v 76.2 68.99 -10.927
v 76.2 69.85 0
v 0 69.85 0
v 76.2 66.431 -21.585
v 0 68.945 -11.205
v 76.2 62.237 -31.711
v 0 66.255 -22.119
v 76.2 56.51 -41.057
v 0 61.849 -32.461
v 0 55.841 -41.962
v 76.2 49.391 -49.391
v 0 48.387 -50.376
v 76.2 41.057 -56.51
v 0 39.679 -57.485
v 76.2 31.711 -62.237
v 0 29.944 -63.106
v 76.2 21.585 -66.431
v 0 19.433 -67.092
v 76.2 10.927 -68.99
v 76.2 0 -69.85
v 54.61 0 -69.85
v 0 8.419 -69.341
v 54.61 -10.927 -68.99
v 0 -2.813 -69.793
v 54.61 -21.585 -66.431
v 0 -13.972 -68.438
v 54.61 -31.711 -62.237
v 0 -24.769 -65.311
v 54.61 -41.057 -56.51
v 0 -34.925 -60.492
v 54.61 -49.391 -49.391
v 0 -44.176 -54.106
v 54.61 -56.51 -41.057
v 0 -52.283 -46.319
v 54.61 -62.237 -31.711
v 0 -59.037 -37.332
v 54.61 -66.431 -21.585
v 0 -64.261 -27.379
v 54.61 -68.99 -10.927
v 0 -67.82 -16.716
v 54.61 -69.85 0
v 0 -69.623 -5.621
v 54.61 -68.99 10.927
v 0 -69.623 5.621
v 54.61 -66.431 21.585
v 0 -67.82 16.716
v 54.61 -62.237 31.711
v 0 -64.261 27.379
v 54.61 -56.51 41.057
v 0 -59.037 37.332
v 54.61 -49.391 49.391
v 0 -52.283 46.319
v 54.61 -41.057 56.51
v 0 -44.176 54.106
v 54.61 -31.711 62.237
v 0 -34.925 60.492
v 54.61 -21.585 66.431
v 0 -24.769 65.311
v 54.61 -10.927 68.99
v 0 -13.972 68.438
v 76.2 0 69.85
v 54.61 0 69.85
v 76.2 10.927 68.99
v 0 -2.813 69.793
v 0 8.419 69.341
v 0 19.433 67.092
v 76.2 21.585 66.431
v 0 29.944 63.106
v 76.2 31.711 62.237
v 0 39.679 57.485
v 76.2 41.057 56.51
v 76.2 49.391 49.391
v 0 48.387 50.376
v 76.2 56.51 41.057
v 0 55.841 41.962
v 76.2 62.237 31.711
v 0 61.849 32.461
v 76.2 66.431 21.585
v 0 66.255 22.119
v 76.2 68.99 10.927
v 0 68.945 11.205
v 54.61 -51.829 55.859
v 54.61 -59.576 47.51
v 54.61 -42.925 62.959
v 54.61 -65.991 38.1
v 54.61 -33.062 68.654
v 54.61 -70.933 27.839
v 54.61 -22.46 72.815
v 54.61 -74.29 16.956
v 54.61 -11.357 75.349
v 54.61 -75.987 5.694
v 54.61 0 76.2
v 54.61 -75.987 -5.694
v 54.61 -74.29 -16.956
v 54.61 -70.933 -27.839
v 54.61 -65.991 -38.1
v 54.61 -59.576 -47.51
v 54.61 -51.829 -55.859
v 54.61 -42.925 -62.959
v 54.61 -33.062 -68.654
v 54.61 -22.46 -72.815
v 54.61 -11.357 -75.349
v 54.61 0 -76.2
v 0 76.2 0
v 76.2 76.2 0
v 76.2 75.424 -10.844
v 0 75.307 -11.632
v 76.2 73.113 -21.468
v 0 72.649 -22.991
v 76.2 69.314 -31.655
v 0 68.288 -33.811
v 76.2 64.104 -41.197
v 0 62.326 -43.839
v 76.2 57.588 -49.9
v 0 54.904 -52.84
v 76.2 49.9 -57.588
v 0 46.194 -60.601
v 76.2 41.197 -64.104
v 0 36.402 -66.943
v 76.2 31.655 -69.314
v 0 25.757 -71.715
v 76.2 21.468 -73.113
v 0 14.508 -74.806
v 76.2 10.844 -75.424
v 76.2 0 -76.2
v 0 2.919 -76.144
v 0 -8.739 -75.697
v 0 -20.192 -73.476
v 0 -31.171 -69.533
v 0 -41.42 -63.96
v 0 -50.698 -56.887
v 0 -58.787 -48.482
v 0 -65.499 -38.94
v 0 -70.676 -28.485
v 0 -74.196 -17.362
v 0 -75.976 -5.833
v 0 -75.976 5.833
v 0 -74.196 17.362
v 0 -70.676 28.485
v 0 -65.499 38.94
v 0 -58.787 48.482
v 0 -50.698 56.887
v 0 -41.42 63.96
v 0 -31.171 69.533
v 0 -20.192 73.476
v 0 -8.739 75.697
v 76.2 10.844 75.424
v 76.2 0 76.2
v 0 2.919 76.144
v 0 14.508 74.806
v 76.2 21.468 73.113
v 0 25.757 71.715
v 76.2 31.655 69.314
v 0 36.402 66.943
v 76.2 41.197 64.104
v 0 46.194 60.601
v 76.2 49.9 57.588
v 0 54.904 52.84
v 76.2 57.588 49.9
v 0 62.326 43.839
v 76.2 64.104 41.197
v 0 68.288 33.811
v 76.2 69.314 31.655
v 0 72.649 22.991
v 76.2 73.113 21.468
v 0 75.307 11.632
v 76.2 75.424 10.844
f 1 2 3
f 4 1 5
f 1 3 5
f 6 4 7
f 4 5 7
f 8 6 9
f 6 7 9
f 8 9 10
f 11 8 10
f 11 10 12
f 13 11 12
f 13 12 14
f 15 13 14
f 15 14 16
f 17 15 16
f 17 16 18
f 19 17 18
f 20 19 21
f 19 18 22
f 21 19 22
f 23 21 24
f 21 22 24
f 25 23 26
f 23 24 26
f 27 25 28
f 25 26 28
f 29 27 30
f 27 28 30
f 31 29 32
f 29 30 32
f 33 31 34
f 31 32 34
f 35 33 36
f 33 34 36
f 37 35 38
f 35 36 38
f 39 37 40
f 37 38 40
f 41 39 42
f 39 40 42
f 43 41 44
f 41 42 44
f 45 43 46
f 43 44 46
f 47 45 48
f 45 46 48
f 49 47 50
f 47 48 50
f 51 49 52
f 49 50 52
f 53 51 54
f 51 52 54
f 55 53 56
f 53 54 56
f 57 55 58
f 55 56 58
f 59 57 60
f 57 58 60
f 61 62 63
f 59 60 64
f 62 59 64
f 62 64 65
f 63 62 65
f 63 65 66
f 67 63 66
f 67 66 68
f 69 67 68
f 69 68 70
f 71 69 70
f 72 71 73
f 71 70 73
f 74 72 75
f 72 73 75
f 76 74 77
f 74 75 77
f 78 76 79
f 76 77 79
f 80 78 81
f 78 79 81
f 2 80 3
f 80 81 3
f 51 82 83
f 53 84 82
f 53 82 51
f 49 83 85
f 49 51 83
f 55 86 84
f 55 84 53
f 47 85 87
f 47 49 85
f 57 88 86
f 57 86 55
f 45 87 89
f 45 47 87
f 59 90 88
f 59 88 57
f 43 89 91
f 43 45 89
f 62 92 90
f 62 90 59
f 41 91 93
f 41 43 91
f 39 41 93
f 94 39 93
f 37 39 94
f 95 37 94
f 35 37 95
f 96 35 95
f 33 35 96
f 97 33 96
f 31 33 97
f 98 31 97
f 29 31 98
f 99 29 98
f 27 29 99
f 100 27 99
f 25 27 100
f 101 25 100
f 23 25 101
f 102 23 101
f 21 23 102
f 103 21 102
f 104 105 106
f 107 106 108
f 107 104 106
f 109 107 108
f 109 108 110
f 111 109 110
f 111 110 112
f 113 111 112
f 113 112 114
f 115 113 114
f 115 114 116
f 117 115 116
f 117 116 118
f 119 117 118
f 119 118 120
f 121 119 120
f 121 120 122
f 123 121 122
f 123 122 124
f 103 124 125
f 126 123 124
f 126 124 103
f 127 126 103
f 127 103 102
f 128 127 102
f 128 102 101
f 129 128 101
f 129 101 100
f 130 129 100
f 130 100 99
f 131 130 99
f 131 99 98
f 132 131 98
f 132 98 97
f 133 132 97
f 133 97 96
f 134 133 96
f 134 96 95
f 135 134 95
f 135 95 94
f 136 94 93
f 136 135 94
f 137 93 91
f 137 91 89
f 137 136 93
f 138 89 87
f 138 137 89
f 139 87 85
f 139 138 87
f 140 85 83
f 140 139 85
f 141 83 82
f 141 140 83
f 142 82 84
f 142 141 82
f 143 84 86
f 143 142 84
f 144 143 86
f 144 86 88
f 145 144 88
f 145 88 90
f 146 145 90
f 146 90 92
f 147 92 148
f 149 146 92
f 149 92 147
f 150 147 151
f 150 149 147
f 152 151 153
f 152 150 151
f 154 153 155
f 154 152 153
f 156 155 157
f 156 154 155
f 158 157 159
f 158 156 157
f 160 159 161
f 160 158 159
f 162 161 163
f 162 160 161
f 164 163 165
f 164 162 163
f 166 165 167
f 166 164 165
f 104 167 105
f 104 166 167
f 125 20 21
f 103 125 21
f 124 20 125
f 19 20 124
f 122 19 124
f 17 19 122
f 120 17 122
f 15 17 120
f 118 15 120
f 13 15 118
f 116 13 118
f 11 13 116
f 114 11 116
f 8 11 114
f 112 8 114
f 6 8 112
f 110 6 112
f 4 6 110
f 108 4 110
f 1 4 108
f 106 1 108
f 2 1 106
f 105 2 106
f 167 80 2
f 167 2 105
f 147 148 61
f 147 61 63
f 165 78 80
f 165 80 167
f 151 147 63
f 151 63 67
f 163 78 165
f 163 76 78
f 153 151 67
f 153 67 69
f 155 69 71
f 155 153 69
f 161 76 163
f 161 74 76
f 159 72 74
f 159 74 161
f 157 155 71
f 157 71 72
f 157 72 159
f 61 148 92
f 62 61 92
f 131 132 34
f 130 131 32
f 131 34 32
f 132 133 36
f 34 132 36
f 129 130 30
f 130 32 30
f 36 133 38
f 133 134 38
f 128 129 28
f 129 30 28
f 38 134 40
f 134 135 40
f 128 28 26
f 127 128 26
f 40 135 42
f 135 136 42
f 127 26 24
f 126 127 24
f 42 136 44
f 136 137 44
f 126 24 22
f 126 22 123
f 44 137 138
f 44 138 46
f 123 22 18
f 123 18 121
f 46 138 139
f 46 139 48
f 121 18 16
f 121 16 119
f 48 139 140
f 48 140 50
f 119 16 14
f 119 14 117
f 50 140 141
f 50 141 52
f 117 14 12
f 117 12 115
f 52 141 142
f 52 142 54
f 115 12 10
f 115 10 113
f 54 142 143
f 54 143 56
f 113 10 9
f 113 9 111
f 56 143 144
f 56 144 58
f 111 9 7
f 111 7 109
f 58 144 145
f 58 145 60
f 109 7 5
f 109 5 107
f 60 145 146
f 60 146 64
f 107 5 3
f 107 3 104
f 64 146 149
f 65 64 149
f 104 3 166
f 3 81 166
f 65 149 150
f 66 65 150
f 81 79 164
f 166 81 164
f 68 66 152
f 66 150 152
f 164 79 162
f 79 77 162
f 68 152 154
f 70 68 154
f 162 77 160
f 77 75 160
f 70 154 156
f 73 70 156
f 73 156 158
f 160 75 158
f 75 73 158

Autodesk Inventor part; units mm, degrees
ref_plane "YZ Plane" through (0, 0, 0) normal (1, 0, 0) x (0, 1, 0)
ref_plane "XY Plane" through (0, 0, 0) normal (0, 0, 1) x (1, 0, 0)
sketch "Sketch1" plane through (0, 0, 0) normal (1, 0, 0) x (0, 1, 0)
  circle A0 centre (0, 0) radius 69.85
  circle A1 centre (0, 0) radius 76.2
  dimension "d0" = 139.7
  dimension "d1" = 152.4
extrude "Extrusion1" add sketch "Sketch1" along normal blind 76.2
sketch "Sketch2" plane through (0, 0, 0) normal (0, 1, 0) x (-1, 0, 0)
  line L0 (-76.2, 76.2) -> (-76.2, -76.2) projected
  line L1 (0, -76.2) -> (-76.2, -76.2) projected
  line L2 (-76.2, 76.2) -> (-54.61, 76.2)
  line L3 (-54.61, 76.2) -> (-54.61, -76.2)
  line L4 (-54.61, -76.2) -> (-76.2, -76.2)
  line L5 (-76.2, -76.2) -> (-76.2, 76.2)
  point P0 (0, 0)
  dimension "d4" = 21.59
extrude "Extrusion2" cut sketch "Sketch2" against normal blind 76.2
properties part number "hopper v1"
